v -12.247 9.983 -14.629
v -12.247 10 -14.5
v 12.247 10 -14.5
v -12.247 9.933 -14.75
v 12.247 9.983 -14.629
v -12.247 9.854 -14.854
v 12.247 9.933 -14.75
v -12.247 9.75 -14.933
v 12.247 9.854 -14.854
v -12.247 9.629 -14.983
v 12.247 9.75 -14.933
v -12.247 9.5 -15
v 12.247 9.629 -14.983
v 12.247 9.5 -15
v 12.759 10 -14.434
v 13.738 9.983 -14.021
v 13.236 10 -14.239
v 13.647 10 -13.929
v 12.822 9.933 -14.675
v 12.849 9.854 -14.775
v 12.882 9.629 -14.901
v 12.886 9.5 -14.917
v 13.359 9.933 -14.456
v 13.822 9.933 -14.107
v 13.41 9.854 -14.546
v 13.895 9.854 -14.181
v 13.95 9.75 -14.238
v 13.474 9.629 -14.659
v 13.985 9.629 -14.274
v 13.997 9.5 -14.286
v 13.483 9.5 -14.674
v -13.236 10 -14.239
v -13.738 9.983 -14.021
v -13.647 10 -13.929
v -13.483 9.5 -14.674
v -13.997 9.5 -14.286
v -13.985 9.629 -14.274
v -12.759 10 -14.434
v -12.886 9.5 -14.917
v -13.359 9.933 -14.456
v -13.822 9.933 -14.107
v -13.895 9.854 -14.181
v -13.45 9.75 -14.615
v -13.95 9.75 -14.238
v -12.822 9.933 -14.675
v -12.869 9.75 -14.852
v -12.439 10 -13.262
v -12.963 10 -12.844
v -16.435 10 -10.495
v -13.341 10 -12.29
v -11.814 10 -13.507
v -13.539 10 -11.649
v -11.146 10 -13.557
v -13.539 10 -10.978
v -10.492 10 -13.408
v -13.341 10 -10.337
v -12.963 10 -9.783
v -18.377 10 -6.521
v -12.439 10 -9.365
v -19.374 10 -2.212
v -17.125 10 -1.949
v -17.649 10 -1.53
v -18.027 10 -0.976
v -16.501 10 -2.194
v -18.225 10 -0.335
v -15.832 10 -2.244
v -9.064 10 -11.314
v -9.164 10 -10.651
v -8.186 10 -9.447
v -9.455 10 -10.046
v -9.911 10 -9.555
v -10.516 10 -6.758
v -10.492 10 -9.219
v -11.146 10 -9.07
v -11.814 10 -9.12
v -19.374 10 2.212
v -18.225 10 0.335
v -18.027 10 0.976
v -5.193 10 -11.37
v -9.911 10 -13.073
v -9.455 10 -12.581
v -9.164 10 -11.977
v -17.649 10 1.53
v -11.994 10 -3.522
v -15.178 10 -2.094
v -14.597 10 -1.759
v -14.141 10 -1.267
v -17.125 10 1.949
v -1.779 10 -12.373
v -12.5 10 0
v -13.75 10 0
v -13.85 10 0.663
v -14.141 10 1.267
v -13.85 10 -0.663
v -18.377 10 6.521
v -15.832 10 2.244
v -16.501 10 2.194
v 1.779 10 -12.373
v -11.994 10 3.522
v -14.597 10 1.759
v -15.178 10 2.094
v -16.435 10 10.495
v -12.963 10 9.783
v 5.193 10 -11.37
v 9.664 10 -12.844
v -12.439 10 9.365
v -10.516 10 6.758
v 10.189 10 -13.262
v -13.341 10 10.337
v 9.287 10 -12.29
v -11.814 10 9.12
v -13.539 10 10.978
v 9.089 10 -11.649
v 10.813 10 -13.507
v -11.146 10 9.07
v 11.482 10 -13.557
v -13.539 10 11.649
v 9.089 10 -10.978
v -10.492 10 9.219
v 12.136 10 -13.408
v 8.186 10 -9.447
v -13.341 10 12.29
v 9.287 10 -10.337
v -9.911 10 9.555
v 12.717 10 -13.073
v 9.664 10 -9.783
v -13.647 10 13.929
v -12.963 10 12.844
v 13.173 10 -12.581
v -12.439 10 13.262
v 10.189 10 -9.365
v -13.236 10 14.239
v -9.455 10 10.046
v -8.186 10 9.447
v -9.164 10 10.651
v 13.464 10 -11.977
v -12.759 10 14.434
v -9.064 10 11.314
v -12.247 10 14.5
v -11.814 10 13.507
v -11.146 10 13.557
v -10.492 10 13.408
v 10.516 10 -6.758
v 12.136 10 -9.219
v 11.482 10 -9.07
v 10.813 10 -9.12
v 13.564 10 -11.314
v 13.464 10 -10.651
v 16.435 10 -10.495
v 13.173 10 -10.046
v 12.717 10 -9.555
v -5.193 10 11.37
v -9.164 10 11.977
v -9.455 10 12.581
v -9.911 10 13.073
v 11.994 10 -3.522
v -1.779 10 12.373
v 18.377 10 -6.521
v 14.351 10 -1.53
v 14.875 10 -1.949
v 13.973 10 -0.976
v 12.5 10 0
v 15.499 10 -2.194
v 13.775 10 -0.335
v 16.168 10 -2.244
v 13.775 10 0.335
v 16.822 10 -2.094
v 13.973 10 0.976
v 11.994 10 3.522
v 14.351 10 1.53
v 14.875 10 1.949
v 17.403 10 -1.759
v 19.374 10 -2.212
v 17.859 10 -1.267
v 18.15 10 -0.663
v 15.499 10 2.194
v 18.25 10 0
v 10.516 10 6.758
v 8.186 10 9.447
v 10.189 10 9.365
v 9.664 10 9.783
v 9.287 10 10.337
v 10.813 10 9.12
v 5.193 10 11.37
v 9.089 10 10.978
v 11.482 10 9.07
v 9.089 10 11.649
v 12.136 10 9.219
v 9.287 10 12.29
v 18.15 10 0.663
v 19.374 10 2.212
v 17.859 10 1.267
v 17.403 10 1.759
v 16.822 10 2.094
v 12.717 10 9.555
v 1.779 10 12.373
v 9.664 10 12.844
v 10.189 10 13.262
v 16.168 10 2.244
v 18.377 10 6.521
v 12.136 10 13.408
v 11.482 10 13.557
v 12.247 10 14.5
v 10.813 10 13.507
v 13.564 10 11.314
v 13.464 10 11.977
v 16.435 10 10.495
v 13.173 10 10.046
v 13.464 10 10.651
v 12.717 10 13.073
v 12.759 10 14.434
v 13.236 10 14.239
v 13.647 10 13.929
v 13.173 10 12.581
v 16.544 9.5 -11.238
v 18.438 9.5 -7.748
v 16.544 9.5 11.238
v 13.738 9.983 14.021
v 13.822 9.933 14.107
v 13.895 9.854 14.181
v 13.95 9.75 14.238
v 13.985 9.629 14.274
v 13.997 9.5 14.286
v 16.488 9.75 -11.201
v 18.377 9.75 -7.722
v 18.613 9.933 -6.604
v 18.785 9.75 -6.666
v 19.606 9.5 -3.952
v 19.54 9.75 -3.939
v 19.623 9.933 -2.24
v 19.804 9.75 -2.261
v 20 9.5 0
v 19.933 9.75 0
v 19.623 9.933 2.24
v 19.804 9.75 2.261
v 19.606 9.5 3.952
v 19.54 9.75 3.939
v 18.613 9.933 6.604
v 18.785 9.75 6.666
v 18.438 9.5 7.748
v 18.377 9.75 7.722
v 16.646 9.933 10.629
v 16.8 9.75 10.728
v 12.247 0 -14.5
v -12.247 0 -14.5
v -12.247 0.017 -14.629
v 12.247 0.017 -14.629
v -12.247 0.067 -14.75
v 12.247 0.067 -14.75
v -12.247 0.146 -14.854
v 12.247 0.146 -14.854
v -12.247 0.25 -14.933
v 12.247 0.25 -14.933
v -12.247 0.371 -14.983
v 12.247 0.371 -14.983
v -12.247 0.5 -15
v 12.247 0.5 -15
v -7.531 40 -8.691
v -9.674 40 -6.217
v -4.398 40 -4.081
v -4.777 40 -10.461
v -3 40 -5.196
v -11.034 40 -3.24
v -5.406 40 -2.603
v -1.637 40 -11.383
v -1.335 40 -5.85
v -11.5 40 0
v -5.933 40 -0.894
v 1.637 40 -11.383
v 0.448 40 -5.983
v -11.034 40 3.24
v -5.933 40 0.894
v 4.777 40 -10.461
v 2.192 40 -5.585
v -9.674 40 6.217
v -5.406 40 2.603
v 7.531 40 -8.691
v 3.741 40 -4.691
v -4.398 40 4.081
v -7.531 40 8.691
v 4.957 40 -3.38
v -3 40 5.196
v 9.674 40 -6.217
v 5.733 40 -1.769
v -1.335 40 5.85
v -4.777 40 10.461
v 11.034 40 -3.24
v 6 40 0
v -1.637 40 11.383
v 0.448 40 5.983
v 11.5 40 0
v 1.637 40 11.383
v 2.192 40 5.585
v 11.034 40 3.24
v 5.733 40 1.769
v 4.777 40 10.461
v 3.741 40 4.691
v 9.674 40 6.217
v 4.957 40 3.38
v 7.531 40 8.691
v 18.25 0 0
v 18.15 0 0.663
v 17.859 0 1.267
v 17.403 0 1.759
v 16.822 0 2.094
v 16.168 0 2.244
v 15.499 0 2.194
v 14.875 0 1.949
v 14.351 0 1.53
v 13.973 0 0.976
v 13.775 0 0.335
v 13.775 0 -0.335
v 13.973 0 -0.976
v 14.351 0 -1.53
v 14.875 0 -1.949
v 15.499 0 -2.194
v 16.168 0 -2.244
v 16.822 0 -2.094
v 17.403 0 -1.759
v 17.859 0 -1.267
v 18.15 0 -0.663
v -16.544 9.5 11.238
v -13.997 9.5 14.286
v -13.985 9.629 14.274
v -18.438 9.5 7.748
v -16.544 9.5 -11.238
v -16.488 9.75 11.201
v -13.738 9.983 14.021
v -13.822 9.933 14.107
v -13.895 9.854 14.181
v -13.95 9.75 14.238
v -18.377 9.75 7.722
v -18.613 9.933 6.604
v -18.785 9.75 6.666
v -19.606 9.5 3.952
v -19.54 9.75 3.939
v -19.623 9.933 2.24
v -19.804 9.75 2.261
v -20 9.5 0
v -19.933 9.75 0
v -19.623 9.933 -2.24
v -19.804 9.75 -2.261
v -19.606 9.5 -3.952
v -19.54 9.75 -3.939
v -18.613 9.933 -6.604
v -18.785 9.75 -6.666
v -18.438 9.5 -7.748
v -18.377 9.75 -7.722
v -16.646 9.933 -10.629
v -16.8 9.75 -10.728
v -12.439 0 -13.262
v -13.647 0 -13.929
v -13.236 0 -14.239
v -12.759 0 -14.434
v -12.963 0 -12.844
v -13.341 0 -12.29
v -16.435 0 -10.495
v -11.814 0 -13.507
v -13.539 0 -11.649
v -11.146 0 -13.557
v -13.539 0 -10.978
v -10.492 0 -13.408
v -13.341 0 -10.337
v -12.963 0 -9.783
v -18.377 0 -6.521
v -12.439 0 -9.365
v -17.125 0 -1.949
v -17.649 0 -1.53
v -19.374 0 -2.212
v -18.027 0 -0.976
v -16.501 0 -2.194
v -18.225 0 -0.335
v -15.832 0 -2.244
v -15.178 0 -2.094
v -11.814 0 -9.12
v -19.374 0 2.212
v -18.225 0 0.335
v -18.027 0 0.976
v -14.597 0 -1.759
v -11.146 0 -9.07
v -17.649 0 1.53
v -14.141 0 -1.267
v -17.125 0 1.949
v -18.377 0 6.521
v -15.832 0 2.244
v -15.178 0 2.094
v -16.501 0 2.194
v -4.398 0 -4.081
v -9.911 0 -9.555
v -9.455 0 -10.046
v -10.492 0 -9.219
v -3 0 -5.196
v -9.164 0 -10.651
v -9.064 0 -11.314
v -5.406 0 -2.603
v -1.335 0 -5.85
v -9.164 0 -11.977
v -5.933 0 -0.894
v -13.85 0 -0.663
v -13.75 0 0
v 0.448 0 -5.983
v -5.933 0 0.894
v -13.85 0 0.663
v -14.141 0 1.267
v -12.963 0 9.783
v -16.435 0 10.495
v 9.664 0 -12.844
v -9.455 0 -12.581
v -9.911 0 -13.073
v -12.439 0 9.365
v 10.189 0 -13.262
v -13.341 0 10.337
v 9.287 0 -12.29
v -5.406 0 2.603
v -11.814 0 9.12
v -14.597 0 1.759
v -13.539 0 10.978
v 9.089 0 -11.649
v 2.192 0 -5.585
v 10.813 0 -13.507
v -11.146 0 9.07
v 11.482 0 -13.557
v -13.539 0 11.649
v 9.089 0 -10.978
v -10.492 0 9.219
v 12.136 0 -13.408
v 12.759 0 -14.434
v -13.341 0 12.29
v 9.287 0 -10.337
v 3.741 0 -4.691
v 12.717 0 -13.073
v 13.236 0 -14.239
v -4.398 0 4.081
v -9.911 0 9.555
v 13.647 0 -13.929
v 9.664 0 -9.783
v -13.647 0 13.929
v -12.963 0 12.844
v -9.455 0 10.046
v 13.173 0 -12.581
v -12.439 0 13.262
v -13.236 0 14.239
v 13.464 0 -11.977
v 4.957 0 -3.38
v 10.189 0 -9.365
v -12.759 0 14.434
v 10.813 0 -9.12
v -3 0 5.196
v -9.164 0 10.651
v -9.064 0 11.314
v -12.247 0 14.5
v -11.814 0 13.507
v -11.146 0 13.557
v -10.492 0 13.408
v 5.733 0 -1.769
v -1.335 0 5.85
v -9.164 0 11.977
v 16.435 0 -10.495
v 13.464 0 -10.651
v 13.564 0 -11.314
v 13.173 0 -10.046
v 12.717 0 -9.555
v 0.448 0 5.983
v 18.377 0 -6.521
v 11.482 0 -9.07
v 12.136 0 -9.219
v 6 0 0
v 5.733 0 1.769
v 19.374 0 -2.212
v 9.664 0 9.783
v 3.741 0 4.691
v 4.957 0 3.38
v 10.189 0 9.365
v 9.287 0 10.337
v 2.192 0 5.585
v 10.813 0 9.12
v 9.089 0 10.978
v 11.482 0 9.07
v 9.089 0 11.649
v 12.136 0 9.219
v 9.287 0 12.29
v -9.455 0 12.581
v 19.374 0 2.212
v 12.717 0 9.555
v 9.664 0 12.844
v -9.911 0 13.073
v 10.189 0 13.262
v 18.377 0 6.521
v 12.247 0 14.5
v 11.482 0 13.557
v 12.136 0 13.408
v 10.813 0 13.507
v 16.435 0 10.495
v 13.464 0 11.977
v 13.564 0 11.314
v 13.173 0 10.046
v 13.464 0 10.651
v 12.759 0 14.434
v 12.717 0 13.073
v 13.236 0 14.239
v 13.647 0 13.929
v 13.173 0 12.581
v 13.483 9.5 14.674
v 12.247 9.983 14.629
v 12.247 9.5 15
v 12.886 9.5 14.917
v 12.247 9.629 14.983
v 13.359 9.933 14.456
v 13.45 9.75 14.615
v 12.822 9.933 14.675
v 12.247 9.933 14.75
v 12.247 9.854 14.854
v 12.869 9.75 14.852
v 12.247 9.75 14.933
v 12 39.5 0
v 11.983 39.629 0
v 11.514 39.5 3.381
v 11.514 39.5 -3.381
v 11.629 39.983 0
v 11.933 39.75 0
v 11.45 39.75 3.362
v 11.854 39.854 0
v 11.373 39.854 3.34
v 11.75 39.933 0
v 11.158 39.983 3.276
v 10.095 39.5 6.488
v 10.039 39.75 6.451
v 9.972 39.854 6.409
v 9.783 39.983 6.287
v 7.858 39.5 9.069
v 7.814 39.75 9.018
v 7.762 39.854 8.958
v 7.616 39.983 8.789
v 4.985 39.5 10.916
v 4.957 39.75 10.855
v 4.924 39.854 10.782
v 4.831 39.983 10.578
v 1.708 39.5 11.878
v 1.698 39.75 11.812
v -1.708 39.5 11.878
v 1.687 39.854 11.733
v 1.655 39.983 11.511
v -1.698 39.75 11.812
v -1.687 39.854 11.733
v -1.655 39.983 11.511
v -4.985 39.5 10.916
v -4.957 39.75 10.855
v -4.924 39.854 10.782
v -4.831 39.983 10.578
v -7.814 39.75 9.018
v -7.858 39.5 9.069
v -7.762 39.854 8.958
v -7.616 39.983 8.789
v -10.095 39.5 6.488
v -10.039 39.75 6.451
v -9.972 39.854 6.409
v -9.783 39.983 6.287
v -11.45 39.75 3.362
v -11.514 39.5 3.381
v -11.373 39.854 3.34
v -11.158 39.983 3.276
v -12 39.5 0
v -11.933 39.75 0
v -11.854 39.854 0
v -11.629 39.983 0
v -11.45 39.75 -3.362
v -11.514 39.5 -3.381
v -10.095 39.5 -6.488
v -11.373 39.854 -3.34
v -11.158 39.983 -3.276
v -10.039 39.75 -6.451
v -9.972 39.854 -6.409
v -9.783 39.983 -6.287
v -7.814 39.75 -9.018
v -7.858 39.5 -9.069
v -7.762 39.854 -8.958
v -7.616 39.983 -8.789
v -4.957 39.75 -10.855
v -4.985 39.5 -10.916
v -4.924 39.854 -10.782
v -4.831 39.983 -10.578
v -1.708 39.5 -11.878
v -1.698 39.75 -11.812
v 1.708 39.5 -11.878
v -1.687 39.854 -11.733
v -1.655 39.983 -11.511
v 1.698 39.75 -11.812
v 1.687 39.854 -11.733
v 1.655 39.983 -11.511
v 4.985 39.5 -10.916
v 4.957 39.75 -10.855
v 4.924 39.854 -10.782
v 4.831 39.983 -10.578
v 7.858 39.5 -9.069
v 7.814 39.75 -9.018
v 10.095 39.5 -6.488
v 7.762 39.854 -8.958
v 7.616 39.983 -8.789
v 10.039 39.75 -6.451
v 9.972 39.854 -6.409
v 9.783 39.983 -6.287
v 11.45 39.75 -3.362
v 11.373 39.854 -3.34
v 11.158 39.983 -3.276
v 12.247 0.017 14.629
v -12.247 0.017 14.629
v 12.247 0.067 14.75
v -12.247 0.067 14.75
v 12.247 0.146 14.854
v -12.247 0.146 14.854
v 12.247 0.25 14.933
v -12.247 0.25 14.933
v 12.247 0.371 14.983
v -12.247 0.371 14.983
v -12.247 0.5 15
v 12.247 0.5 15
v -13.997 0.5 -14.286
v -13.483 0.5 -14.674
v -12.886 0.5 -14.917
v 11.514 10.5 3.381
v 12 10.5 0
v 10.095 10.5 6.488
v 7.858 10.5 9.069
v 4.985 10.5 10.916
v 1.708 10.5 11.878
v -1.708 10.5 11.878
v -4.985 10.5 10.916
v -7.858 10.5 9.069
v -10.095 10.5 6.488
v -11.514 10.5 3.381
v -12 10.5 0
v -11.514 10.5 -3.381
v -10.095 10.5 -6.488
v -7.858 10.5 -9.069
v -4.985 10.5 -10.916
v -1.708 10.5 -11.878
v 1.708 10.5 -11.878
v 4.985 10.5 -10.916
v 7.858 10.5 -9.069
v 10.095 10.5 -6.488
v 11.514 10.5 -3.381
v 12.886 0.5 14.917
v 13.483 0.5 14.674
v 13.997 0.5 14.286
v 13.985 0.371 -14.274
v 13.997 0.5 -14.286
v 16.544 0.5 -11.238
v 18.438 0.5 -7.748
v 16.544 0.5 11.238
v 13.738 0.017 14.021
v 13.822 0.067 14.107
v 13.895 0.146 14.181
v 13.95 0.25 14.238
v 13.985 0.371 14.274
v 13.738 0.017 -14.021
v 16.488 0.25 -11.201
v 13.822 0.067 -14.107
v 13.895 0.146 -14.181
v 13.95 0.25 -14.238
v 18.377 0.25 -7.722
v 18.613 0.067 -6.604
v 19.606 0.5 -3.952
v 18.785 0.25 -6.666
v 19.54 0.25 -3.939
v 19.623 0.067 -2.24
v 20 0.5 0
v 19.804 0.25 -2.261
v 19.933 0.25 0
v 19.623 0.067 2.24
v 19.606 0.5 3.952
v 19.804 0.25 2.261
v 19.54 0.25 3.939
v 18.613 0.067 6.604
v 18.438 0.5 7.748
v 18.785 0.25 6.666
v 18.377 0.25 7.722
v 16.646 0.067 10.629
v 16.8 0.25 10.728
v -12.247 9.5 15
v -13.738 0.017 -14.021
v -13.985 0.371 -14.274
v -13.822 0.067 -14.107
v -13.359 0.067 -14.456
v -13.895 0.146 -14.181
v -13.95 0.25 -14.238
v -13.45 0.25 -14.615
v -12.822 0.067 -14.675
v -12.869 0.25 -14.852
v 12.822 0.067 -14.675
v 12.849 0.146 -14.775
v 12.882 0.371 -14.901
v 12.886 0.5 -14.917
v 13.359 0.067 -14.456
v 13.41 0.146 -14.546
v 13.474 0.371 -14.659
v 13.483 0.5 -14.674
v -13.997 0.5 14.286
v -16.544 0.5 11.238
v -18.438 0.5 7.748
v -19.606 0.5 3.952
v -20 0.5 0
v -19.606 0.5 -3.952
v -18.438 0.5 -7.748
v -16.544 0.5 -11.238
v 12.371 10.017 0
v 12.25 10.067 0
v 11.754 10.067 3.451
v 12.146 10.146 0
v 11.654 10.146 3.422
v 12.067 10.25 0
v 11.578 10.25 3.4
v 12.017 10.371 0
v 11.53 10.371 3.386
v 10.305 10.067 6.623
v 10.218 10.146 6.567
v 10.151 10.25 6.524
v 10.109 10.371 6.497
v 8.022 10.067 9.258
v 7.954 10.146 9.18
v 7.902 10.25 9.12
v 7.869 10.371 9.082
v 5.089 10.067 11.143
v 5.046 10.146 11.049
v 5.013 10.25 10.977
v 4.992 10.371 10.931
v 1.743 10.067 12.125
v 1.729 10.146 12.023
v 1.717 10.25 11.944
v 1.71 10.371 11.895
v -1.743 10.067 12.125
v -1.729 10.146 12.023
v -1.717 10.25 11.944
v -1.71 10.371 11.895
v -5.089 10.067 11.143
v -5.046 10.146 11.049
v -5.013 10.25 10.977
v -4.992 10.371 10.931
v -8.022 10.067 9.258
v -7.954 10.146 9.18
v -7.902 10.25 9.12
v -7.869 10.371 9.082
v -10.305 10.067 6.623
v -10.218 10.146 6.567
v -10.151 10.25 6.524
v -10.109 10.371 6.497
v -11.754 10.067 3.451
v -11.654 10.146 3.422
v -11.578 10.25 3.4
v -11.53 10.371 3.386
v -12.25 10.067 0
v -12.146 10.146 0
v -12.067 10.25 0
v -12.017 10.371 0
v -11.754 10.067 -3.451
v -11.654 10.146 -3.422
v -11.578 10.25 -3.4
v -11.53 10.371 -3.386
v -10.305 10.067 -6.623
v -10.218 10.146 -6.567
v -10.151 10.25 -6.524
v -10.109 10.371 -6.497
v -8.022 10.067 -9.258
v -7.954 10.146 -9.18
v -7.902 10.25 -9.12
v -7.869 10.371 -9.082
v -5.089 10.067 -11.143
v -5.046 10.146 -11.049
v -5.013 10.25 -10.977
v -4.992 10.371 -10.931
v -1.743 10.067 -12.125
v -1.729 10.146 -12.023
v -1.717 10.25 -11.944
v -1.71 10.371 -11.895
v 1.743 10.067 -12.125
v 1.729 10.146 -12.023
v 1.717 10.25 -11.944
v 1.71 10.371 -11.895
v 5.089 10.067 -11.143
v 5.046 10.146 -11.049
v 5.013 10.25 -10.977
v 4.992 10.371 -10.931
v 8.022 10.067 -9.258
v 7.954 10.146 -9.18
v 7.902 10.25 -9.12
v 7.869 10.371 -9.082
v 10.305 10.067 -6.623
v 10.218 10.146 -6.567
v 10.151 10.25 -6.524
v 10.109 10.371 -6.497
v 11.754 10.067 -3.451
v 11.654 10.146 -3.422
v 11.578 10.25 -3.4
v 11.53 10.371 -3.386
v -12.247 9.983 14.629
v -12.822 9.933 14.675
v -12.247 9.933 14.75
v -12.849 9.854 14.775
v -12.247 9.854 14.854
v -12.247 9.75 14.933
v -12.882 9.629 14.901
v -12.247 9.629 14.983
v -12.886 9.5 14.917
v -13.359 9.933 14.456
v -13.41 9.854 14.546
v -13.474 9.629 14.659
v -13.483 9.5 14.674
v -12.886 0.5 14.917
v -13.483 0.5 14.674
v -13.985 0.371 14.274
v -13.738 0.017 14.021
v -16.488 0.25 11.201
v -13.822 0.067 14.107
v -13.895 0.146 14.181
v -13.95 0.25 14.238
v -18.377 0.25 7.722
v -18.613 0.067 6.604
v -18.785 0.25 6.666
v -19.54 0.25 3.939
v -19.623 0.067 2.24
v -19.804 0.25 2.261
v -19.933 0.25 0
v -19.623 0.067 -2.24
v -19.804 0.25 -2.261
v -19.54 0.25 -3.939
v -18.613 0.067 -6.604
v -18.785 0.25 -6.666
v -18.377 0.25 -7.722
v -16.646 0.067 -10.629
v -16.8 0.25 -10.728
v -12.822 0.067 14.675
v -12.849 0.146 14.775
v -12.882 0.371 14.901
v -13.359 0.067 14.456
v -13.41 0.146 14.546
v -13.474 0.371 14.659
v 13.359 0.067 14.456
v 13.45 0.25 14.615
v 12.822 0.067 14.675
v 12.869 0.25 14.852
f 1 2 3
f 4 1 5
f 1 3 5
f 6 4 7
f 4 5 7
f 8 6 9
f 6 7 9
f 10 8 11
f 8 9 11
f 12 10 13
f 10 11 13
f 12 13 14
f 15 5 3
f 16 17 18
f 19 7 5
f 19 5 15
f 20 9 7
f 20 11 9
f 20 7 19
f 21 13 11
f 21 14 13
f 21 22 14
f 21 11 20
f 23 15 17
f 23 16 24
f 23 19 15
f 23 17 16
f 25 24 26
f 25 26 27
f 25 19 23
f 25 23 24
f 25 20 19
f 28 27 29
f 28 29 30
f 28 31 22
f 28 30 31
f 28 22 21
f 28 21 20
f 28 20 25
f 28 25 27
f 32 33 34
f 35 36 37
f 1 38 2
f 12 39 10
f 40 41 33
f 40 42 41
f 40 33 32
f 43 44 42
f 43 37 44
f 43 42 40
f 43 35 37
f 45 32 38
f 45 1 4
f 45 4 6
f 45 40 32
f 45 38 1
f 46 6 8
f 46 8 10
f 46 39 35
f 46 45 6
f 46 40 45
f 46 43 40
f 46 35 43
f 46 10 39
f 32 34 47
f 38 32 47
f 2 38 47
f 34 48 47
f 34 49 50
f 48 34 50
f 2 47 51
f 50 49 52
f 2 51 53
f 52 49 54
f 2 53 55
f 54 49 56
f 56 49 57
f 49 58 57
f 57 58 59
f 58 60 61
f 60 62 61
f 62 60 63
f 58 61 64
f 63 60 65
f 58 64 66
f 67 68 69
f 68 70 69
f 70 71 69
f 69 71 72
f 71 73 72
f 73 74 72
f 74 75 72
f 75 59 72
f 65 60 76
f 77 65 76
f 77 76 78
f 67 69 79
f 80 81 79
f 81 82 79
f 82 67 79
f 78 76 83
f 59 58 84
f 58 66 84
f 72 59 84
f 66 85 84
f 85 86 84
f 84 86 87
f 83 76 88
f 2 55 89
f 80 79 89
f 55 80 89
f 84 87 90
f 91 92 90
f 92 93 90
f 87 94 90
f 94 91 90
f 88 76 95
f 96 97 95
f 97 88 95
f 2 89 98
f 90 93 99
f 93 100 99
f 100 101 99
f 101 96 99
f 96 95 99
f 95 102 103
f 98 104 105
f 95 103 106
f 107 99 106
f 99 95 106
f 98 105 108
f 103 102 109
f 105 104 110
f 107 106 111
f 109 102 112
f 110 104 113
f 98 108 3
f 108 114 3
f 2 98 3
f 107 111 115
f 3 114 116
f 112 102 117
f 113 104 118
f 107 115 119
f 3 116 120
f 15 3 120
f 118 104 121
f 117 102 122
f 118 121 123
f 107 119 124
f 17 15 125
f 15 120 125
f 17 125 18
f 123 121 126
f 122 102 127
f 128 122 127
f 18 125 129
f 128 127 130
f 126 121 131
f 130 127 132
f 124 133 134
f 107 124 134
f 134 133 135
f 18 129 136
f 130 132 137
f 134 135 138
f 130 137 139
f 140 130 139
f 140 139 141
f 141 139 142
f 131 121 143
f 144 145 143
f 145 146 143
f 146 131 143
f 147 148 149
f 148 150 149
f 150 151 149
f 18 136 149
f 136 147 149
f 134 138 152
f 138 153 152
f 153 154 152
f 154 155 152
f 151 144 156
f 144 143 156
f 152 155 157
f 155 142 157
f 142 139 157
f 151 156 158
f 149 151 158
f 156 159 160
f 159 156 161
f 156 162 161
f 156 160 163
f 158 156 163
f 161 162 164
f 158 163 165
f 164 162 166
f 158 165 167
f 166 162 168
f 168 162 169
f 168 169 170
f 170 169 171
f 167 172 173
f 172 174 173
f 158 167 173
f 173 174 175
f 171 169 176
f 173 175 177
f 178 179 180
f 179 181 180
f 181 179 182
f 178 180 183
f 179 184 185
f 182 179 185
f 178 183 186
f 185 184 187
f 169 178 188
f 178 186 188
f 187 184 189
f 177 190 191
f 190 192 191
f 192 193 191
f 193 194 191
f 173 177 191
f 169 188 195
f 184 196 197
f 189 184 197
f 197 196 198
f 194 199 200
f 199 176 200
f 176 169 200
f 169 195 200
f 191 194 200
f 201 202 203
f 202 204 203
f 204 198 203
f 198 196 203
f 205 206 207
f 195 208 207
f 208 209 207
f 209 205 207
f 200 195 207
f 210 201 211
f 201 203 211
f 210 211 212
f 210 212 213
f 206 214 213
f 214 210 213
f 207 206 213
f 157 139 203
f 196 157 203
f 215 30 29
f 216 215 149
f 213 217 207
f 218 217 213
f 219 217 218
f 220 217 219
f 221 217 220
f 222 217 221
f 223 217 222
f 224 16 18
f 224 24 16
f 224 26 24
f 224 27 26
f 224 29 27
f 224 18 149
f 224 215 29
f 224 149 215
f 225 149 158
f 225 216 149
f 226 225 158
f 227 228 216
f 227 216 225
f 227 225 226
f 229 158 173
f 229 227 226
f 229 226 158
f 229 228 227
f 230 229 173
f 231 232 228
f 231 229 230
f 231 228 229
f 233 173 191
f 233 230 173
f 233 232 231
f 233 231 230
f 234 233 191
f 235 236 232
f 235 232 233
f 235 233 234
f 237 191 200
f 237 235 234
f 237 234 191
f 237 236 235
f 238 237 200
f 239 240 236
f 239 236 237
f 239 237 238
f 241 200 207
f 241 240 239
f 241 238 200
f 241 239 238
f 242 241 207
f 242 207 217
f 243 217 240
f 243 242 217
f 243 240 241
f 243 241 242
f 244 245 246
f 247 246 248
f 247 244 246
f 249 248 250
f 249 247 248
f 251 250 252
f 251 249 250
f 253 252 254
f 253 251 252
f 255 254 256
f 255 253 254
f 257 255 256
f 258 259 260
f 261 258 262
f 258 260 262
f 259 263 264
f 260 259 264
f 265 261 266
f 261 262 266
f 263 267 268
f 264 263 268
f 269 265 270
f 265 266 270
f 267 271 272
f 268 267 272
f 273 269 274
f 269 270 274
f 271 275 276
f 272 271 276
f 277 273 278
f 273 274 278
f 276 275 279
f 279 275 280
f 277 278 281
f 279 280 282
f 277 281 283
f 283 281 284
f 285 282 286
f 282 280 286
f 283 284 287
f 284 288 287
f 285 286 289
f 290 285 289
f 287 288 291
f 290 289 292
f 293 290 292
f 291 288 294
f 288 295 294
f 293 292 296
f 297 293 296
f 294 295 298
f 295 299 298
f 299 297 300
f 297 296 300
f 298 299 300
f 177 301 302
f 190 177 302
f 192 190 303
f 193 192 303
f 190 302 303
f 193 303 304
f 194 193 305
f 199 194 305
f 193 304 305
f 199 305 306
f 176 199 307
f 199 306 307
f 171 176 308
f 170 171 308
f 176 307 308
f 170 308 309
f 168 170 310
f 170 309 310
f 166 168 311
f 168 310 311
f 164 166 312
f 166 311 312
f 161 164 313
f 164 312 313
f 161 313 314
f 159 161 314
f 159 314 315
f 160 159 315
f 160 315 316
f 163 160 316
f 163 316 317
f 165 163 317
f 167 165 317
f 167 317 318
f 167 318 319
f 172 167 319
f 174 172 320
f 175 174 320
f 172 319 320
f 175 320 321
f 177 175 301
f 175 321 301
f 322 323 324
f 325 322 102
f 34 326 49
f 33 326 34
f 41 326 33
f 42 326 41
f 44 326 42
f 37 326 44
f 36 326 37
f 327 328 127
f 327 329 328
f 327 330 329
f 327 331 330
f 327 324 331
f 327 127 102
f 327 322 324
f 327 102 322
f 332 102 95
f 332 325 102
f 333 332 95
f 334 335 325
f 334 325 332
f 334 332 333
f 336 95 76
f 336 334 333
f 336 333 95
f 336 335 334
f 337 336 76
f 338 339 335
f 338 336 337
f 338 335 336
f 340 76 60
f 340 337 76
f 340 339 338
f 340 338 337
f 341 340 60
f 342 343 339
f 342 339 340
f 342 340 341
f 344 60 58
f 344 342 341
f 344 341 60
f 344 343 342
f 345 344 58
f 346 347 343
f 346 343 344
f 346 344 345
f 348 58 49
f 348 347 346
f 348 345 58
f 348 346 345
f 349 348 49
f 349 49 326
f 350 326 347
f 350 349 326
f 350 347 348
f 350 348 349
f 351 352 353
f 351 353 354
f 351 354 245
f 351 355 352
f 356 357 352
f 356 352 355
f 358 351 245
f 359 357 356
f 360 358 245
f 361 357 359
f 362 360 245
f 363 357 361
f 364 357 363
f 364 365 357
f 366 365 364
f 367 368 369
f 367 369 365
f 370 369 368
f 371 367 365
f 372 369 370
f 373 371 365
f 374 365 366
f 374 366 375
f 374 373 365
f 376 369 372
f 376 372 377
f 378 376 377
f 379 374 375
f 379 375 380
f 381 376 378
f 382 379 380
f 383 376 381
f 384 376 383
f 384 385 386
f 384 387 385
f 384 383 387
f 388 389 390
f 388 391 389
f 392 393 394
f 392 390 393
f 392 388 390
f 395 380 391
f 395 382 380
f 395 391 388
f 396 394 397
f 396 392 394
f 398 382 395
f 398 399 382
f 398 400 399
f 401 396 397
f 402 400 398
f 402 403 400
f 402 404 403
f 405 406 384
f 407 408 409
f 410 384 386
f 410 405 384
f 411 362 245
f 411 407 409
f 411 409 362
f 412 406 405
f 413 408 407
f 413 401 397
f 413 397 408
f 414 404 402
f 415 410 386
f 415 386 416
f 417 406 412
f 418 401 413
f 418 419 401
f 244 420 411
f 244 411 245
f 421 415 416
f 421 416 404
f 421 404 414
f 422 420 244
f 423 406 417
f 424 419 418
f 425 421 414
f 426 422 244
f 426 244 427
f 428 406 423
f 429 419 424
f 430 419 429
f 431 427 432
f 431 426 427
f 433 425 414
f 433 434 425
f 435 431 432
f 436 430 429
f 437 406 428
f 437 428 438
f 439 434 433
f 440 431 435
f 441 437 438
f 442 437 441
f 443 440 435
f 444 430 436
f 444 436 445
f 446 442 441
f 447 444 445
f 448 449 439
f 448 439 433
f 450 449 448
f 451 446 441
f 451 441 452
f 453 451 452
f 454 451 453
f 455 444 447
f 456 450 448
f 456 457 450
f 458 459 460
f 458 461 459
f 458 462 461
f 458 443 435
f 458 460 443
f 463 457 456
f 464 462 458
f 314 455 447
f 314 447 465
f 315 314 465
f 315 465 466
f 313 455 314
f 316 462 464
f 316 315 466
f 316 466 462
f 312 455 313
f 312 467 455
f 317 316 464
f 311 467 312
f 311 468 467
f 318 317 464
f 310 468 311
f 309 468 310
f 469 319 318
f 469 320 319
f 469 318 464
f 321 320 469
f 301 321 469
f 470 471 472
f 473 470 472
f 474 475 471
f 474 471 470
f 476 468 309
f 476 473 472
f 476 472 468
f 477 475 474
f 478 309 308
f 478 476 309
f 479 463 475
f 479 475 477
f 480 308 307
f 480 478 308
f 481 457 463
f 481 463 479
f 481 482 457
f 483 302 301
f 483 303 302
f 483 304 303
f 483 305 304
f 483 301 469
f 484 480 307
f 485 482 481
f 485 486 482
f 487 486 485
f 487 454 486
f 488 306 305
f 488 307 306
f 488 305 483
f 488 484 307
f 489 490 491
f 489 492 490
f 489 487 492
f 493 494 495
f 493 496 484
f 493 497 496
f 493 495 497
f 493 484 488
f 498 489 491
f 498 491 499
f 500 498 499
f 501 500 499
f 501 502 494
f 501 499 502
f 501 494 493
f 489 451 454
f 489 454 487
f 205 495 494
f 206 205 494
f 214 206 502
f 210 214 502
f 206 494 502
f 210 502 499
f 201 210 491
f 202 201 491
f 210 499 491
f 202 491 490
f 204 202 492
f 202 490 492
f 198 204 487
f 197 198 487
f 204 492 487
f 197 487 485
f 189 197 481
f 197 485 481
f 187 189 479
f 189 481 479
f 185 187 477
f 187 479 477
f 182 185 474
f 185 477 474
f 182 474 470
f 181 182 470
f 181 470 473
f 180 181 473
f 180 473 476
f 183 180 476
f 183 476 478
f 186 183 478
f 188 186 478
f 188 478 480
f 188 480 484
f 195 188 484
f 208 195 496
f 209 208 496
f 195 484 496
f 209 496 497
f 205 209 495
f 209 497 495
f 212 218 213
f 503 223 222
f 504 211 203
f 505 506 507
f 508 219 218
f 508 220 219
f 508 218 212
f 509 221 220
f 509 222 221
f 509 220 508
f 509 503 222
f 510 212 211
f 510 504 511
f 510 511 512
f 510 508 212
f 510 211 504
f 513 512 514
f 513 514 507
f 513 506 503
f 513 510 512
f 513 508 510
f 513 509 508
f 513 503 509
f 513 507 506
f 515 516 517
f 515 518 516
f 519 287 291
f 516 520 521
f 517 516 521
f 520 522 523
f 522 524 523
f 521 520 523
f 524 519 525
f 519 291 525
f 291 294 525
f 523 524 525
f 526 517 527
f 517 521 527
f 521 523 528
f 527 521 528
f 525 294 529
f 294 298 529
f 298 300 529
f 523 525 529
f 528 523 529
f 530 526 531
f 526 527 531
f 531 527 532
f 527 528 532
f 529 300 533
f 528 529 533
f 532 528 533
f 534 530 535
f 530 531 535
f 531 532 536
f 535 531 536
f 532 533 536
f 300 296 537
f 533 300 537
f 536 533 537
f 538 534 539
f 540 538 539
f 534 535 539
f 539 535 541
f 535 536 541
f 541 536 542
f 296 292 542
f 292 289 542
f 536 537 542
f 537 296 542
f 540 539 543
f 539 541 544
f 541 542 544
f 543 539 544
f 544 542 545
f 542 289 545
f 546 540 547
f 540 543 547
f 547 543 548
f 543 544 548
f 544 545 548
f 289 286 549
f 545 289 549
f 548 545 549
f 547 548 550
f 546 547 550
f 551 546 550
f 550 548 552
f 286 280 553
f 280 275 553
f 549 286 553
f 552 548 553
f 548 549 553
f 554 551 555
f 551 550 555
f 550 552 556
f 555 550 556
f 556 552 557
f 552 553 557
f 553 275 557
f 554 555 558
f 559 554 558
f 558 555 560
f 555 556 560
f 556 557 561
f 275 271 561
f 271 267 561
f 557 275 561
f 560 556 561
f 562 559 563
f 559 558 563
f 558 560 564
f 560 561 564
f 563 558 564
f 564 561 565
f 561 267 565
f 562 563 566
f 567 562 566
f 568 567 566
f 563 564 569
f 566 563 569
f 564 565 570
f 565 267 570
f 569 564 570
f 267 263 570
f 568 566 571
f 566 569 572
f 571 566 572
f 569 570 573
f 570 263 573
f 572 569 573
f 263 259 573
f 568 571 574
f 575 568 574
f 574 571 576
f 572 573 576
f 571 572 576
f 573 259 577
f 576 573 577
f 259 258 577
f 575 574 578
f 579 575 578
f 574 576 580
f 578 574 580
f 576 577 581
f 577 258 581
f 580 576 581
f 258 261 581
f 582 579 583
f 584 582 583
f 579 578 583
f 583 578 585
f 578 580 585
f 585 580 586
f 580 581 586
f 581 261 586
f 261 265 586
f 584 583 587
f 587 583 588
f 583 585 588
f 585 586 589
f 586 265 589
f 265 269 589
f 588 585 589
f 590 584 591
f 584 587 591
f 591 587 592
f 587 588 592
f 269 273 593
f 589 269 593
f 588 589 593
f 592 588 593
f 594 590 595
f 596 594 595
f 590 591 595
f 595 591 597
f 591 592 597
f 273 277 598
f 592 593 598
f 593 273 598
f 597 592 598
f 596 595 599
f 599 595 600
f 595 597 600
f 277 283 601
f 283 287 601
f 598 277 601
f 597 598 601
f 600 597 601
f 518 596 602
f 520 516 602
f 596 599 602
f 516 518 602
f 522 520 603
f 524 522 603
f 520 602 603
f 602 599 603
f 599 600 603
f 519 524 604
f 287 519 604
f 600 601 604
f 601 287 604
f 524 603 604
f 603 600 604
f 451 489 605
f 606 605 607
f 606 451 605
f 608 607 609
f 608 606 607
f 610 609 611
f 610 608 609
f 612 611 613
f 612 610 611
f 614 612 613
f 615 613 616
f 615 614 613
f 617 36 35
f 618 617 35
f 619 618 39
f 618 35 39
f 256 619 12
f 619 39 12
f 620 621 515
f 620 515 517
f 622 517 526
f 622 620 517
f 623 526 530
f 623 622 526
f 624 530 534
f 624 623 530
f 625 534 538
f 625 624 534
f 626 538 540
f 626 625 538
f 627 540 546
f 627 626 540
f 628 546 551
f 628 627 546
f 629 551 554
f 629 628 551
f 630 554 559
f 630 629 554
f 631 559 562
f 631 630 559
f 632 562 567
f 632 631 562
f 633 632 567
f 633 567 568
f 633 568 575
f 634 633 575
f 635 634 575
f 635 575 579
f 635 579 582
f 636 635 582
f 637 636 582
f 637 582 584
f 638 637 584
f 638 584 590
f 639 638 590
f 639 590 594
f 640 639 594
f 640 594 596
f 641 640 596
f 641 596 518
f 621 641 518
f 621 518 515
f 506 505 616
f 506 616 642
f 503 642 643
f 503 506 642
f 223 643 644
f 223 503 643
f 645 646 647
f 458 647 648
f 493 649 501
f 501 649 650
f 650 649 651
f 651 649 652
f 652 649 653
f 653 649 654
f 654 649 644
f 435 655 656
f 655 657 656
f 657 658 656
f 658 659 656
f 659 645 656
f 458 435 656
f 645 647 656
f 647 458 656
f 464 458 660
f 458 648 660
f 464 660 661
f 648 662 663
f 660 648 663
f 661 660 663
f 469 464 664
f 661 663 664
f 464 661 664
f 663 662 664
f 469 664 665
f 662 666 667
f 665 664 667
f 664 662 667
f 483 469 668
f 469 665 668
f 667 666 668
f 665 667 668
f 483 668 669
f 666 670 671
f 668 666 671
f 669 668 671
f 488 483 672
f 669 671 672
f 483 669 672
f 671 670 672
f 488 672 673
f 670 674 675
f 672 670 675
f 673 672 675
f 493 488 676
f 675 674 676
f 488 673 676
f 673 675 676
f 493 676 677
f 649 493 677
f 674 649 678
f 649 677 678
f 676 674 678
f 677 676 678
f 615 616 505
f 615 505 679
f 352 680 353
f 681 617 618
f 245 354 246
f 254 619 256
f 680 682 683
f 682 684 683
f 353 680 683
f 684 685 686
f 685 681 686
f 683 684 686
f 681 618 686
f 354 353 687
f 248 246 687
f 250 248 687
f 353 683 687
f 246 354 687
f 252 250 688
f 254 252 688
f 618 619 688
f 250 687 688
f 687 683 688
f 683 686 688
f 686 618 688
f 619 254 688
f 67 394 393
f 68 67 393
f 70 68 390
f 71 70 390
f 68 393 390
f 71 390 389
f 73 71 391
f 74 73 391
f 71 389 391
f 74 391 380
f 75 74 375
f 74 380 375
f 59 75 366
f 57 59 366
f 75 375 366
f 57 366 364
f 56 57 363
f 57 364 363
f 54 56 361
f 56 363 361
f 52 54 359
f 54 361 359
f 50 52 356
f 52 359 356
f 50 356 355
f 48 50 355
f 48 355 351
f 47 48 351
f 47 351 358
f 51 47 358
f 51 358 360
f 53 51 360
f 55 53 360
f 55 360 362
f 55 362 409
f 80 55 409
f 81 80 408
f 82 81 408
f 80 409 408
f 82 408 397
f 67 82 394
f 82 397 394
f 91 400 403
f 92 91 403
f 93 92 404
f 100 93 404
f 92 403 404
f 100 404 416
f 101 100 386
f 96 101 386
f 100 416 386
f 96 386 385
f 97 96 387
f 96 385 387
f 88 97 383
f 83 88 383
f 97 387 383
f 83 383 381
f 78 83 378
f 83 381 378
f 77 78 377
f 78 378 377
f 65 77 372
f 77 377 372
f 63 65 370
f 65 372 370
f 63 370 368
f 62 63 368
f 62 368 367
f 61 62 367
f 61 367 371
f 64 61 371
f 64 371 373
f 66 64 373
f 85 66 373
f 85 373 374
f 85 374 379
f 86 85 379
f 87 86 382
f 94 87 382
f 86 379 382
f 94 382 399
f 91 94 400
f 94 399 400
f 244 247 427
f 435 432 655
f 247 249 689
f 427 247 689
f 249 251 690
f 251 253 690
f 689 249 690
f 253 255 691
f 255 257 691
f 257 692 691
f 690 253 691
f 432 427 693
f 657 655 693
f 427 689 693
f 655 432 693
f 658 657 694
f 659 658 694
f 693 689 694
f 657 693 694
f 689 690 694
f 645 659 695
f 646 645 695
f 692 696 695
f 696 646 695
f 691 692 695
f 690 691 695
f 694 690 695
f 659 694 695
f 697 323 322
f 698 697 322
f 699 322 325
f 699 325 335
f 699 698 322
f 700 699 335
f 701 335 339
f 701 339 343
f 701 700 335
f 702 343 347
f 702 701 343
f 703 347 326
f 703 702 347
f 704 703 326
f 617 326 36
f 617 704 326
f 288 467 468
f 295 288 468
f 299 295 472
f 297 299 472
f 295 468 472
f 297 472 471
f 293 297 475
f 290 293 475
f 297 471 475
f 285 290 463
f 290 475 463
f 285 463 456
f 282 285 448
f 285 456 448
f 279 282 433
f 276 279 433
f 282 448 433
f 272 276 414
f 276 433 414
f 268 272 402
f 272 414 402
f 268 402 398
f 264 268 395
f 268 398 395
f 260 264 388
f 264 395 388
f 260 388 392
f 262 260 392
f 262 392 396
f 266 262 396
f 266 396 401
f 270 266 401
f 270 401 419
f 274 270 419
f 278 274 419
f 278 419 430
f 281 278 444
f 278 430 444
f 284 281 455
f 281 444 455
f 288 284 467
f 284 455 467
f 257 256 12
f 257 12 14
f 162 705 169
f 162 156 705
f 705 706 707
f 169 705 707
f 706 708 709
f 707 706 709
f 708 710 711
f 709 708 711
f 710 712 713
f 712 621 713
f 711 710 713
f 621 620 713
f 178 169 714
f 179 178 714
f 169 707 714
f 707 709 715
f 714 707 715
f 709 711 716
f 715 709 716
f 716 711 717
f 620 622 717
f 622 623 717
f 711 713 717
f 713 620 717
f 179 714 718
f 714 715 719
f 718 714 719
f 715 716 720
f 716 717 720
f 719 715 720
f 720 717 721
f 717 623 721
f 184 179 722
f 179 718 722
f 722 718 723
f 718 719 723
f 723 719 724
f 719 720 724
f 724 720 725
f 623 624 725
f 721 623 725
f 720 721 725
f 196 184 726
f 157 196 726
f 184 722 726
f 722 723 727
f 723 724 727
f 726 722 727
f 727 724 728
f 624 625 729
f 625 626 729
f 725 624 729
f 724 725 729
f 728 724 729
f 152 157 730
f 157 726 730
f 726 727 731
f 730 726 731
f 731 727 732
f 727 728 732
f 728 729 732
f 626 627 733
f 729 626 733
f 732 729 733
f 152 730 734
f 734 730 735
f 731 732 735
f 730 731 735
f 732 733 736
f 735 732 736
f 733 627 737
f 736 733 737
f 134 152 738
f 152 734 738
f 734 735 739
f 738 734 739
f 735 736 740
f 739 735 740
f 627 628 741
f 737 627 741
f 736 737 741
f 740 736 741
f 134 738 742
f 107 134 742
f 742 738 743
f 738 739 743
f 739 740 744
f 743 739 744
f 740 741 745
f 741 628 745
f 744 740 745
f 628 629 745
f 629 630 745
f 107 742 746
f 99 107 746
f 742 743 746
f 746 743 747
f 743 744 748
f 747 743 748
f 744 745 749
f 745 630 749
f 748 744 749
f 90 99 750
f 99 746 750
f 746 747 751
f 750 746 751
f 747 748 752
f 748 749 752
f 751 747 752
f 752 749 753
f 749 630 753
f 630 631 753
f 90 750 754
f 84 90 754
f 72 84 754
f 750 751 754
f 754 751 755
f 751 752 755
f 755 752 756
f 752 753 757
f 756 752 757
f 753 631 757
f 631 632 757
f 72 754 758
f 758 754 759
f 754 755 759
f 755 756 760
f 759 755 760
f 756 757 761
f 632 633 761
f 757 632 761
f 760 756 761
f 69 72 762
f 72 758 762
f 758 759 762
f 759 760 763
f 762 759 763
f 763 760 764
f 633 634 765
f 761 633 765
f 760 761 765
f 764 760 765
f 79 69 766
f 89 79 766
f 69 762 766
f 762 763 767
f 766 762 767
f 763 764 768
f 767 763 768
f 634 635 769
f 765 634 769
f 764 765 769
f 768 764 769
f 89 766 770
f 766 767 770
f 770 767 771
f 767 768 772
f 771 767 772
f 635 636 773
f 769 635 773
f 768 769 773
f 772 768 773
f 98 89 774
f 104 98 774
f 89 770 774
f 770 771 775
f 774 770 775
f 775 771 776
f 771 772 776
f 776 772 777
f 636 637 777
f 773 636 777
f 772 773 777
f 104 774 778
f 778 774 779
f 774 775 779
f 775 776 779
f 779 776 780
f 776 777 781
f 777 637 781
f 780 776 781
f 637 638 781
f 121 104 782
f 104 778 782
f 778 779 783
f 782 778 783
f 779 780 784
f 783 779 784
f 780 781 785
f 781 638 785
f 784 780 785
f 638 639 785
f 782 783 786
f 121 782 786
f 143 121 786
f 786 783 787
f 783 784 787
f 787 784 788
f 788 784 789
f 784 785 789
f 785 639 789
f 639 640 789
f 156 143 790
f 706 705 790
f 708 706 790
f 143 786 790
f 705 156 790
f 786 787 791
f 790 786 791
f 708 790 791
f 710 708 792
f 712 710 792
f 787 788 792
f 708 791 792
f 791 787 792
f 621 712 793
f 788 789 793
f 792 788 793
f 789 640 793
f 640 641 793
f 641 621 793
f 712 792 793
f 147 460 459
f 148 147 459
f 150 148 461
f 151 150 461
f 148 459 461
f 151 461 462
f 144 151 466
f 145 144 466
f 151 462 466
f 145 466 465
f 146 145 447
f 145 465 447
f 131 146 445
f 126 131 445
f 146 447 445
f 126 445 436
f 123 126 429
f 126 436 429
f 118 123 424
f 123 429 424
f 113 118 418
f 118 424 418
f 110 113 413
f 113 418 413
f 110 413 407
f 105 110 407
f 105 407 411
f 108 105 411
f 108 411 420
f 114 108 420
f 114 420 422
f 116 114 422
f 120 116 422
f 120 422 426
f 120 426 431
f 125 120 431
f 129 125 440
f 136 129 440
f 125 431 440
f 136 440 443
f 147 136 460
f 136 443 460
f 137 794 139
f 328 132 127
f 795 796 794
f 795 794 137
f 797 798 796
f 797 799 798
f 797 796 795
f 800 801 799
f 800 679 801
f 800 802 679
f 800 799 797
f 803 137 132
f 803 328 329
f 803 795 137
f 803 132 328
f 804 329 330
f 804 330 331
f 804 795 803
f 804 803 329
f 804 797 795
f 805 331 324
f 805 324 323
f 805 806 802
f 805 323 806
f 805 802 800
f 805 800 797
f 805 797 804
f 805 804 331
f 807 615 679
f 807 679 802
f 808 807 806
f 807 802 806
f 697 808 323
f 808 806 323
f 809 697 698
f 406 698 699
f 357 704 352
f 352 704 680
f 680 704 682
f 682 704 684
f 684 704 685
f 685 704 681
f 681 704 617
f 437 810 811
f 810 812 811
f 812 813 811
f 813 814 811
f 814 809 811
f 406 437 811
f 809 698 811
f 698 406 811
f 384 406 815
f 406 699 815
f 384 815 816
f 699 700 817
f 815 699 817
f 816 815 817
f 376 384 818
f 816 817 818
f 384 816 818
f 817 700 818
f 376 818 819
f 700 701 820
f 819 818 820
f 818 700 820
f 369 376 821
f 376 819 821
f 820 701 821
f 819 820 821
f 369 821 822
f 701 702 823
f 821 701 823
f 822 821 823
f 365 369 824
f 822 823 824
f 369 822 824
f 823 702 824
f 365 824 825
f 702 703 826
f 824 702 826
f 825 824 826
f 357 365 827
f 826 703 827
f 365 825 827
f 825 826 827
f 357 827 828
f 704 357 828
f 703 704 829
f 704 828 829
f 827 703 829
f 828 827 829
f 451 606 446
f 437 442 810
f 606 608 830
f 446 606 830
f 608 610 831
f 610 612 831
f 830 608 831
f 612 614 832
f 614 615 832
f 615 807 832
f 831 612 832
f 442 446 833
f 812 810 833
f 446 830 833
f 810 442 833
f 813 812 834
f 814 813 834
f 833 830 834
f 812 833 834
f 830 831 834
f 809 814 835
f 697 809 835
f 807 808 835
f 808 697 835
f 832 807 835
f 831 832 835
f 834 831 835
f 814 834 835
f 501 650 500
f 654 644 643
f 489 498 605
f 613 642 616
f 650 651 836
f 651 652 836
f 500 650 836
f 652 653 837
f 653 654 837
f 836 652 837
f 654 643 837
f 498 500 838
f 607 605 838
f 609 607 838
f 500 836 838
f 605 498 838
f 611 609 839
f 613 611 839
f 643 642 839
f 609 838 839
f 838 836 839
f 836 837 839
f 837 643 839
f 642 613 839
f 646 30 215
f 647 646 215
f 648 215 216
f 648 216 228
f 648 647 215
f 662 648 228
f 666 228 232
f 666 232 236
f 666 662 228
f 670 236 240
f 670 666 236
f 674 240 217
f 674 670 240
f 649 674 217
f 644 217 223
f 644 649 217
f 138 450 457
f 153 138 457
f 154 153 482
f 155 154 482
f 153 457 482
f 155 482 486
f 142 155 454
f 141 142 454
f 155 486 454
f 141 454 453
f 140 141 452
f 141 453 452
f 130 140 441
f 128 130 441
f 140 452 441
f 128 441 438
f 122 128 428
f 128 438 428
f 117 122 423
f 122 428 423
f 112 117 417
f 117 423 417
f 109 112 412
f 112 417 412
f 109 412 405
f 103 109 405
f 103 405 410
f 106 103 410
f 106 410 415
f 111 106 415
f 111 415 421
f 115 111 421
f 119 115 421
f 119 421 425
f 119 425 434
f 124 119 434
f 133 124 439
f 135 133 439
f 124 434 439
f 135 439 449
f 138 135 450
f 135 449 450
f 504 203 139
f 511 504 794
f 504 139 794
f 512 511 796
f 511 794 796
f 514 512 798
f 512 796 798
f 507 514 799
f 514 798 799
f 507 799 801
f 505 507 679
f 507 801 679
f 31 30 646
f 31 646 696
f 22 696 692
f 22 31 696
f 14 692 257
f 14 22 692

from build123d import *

# Parameters (mm, degrees)
F1_R     = 12
F1_R_2   = 6
F2_DEPTH = 40
F1_R_3   = 2.25
F3_DEPTH = 10
F4_R     = 2.5
F5_R     = 0.5


with BuildPart() as f2:
    # F1 (on Front) → F2 (new body)
    with BuildSketch(Plane.XZ):
        Circle(F1_R)
        Circle(F1_R_2, mode=Mode.SUBTRACT)
    extrude(amount=-F2_DEPTH)

    # F1 (on Front) → F3 (join)
    with BuildSketch(Plane.XZ):
        with BuildLine():
            Line((13.228757, 15), (-13.228757, 15))
            ThreePointArc((-13.228757, 15), (-20, 0), (-13.228757, -15))
            Line((-13.228757, -15), (13.228757, -15))
            ThreePointArc((13.228757, -15), (20, 0), (13.228757, 15))
        make_face()
        with Locations((-11.313708, -11.313708)):
            Circle(F1_R_3, mode=Mode.SUBTRACT)
        with Locations((-16, 0)):
            Circle(F1_R_3, mode=Mode.SUBTRACT)
        Circle(F1_R, mode=Mode.SUBTRACT)
        with Locations((11.313708, -11.313708)):
            Circle(F1_R_3, mode=Mode.SUBTRACT)
        with Locations((16, 0)):
            Circle(F1_R_3, mode=Mode.SUBTRACT)
        with Locations((-11.313708, 11.313708)):
            Circle(F1_R_3, mode=Mode.SUBTRACT)
        with Locations((11.313708, 11.313708)):
            Circle(F1_R_3, mode=Mode.SUBTRACT)
    extrude(amount=-F3_DEPTH)

    # F4
    f4_edges = [f2.edges().sort_by_distance(p)[0] for p in [
        (-13.228757, 5, 15),
        (-13.228757, 5, -15),
        (13.228757, 5, 15),
        (13.228757, 5, -15),
    ]]
    fillet(f4_edges, radius=F4_R)

    # F5
    f5_edges = [f2.edges().sort_by_distance(p)[0] for p in [
        (20, 10, 0),
        (20, 0, 0),
        (-12, 10, 0),
        (-12, 40, 0),
    ]]
    fillet(f5_edges, radius=F5_R)


solid = f2.part
